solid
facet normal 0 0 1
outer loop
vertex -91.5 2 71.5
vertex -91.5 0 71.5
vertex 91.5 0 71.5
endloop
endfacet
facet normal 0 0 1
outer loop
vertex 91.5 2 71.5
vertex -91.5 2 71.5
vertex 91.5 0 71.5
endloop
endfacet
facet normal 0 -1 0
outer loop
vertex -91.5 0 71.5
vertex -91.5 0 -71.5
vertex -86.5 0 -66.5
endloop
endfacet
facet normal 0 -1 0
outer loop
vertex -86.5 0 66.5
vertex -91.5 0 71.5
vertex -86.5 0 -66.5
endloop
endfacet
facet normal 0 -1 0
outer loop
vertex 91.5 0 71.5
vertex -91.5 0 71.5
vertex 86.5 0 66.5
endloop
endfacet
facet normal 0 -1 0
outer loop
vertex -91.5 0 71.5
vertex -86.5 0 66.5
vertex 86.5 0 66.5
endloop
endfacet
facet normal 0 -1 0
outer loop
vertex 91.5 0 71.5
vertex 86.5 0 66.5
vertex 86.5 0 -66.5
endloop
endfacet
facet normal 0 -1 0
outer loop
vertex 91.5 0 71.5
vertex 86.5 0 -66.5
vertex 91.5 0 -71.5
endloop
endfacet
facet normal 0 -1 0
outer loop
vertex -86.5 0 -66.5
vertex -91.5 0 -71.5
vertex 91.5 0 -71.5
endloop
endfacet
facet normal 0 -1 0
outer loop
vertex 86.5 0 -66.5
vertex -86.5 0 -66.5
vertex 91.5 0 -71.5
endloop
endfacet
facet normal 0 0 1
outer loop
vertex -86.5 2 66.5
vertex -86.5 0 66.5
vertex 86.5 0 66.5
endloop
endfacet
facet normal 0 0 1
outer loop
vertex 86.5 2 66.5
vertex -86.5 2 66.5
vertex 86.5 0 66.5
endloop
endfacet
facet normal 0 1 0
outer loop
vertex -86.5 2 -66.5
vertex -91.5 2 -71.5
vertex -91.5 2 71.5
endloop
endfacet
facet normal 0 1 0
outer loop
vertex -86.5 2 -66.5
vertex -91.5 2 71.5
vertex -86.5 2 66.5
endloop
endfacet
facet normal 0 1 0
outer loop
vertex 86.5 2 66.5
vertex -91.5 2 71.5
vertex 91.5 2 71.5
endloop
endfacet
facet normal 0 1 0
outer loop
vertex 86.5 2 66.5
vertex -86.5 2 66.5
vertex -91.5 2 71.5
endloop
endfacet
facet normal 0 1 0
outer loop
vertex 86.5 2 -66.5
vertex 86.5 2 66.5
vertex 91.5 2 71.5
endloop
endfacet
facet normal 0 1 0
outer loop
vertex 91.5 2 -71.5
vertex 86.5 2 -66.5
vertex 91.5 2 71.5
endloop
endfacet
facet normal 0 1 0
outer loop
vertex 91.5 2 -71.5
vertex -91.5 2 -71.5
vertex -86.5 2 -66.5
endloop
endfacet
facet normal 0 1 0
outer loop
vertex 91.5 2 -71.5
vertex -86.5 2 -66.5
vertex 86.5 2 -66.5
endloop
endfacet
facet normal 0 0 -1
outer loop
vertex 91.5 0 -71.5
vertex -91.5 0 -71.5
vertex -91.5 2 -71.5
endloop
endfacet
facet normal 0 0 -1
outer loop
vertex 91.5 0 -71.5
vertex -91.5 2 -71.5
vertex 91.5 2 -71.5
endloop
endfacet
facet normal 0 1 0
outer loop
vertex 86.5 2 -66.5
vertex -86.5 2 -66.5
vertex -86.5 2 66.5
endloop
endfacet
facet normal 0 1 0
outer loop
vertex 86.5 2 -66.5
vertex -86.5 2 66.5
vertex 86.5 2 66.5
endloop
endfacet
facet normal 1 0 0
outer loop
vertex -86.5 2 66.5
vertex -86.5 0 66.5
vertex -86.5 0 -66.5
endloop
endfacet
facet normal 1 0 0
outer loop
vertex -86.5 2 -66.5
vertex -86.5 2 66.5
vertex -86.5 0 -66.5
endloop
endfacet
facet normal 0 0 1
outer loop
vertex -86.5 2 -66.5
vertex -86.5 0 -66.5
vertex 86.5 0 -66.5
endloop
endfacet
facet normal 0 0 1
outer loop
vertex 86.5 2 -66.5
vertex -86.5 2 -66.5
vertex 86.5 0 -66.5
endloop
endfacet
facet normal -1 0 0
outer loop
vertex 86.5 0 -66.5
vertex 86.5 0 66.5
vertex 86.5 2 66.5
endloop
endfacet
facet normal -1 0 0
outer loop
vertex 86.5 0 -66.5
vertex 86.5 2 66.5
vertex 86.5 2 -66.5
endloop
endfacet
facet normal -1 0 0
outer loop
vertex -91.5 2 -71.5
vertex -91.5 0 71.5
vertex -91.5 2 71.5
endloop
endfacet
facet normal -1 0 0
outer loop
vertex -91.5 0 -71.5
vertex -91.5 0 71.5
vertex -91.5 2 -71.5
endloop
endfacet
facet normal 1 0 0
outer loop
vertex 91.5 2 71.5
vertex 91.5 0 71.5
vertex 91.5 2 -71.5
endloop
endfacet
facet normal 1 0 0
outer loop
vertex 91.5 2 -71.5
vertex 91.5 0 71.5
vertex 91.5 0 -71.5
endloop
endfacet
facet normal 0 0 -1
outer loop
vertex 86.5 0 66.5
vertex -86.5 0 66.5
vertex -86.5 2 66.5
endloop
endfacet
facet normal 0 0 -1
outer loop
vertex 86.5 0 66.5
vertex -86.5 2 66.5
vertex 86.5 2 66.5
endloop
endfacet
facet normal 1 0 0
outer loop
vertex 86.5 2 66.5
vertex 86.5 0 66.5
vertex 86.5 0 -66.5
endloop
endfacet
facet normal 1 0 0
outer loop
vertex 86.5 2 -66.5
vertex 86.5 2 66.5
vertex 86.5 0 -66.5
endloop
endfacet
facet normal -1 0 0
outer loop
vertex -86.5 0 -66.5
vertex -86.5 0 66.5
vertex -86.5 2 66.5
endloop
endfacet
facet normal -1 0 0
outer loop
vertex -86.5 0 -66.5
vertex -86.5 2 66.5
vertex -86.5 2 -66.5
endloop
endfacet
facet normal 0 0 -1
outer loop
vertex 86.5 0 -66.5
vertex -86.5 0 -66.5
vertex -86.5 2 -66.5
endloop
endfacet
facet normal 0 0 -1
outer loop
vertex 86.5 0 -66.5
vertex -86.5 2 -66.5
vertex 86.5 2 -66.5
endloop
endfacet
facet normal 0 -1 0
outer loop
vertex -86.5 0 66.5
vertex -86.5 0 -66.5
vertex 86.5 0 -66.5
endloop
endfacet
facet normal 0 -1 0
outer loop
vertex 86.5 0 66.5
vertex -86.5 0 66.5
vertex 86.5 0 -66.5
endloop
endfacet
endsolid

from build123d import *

# Parameters (mm, degrees)
SKETCH1_W           = 183
SKETCH1_H           = 143
SKETCH1_W_2         = 173
SKETCH1_H_2         = 133
BOSS_EXTRUDE1_DEPTH = 2
SKETCH1_2_W         = 173
SKETCH1_2_H         = 133
BOSS_EXTRUDE2_DEPTH = 2


with BuildPart() as part:
    # Sketch1 → Boss-Extrude1 (new body)
    with BuildSketch(Plane(origin=(0, 0, 0), x_dir=(1, 0, 0), z_dir=(0, 1, 0))):
        Rectangle(SKETCH1_W, SKETCH1_H)
        Rectangle(SKETCH1_W_2, SKETCH1_H_2, mode=Mode.SUBTRACT)
    extrude(amount=BOSS_EXTRUDE1_DEPTH)


with BuildPart() as body_2:
    # Sketch1<2> → Boss-Extrude2 (new body)
    with BuildSketch(Plane(origin=(0, 0, 0), x_dir=(1, 0, 0), z_dir=(0, 1, 0))):
        Rectangle(SKETCH1_2_W, SKETCH1_2_H)
    extrude(amount=BOSS_EXTRUDE2_DEPTH)


solid = Compound([part.part, body_2.part])
